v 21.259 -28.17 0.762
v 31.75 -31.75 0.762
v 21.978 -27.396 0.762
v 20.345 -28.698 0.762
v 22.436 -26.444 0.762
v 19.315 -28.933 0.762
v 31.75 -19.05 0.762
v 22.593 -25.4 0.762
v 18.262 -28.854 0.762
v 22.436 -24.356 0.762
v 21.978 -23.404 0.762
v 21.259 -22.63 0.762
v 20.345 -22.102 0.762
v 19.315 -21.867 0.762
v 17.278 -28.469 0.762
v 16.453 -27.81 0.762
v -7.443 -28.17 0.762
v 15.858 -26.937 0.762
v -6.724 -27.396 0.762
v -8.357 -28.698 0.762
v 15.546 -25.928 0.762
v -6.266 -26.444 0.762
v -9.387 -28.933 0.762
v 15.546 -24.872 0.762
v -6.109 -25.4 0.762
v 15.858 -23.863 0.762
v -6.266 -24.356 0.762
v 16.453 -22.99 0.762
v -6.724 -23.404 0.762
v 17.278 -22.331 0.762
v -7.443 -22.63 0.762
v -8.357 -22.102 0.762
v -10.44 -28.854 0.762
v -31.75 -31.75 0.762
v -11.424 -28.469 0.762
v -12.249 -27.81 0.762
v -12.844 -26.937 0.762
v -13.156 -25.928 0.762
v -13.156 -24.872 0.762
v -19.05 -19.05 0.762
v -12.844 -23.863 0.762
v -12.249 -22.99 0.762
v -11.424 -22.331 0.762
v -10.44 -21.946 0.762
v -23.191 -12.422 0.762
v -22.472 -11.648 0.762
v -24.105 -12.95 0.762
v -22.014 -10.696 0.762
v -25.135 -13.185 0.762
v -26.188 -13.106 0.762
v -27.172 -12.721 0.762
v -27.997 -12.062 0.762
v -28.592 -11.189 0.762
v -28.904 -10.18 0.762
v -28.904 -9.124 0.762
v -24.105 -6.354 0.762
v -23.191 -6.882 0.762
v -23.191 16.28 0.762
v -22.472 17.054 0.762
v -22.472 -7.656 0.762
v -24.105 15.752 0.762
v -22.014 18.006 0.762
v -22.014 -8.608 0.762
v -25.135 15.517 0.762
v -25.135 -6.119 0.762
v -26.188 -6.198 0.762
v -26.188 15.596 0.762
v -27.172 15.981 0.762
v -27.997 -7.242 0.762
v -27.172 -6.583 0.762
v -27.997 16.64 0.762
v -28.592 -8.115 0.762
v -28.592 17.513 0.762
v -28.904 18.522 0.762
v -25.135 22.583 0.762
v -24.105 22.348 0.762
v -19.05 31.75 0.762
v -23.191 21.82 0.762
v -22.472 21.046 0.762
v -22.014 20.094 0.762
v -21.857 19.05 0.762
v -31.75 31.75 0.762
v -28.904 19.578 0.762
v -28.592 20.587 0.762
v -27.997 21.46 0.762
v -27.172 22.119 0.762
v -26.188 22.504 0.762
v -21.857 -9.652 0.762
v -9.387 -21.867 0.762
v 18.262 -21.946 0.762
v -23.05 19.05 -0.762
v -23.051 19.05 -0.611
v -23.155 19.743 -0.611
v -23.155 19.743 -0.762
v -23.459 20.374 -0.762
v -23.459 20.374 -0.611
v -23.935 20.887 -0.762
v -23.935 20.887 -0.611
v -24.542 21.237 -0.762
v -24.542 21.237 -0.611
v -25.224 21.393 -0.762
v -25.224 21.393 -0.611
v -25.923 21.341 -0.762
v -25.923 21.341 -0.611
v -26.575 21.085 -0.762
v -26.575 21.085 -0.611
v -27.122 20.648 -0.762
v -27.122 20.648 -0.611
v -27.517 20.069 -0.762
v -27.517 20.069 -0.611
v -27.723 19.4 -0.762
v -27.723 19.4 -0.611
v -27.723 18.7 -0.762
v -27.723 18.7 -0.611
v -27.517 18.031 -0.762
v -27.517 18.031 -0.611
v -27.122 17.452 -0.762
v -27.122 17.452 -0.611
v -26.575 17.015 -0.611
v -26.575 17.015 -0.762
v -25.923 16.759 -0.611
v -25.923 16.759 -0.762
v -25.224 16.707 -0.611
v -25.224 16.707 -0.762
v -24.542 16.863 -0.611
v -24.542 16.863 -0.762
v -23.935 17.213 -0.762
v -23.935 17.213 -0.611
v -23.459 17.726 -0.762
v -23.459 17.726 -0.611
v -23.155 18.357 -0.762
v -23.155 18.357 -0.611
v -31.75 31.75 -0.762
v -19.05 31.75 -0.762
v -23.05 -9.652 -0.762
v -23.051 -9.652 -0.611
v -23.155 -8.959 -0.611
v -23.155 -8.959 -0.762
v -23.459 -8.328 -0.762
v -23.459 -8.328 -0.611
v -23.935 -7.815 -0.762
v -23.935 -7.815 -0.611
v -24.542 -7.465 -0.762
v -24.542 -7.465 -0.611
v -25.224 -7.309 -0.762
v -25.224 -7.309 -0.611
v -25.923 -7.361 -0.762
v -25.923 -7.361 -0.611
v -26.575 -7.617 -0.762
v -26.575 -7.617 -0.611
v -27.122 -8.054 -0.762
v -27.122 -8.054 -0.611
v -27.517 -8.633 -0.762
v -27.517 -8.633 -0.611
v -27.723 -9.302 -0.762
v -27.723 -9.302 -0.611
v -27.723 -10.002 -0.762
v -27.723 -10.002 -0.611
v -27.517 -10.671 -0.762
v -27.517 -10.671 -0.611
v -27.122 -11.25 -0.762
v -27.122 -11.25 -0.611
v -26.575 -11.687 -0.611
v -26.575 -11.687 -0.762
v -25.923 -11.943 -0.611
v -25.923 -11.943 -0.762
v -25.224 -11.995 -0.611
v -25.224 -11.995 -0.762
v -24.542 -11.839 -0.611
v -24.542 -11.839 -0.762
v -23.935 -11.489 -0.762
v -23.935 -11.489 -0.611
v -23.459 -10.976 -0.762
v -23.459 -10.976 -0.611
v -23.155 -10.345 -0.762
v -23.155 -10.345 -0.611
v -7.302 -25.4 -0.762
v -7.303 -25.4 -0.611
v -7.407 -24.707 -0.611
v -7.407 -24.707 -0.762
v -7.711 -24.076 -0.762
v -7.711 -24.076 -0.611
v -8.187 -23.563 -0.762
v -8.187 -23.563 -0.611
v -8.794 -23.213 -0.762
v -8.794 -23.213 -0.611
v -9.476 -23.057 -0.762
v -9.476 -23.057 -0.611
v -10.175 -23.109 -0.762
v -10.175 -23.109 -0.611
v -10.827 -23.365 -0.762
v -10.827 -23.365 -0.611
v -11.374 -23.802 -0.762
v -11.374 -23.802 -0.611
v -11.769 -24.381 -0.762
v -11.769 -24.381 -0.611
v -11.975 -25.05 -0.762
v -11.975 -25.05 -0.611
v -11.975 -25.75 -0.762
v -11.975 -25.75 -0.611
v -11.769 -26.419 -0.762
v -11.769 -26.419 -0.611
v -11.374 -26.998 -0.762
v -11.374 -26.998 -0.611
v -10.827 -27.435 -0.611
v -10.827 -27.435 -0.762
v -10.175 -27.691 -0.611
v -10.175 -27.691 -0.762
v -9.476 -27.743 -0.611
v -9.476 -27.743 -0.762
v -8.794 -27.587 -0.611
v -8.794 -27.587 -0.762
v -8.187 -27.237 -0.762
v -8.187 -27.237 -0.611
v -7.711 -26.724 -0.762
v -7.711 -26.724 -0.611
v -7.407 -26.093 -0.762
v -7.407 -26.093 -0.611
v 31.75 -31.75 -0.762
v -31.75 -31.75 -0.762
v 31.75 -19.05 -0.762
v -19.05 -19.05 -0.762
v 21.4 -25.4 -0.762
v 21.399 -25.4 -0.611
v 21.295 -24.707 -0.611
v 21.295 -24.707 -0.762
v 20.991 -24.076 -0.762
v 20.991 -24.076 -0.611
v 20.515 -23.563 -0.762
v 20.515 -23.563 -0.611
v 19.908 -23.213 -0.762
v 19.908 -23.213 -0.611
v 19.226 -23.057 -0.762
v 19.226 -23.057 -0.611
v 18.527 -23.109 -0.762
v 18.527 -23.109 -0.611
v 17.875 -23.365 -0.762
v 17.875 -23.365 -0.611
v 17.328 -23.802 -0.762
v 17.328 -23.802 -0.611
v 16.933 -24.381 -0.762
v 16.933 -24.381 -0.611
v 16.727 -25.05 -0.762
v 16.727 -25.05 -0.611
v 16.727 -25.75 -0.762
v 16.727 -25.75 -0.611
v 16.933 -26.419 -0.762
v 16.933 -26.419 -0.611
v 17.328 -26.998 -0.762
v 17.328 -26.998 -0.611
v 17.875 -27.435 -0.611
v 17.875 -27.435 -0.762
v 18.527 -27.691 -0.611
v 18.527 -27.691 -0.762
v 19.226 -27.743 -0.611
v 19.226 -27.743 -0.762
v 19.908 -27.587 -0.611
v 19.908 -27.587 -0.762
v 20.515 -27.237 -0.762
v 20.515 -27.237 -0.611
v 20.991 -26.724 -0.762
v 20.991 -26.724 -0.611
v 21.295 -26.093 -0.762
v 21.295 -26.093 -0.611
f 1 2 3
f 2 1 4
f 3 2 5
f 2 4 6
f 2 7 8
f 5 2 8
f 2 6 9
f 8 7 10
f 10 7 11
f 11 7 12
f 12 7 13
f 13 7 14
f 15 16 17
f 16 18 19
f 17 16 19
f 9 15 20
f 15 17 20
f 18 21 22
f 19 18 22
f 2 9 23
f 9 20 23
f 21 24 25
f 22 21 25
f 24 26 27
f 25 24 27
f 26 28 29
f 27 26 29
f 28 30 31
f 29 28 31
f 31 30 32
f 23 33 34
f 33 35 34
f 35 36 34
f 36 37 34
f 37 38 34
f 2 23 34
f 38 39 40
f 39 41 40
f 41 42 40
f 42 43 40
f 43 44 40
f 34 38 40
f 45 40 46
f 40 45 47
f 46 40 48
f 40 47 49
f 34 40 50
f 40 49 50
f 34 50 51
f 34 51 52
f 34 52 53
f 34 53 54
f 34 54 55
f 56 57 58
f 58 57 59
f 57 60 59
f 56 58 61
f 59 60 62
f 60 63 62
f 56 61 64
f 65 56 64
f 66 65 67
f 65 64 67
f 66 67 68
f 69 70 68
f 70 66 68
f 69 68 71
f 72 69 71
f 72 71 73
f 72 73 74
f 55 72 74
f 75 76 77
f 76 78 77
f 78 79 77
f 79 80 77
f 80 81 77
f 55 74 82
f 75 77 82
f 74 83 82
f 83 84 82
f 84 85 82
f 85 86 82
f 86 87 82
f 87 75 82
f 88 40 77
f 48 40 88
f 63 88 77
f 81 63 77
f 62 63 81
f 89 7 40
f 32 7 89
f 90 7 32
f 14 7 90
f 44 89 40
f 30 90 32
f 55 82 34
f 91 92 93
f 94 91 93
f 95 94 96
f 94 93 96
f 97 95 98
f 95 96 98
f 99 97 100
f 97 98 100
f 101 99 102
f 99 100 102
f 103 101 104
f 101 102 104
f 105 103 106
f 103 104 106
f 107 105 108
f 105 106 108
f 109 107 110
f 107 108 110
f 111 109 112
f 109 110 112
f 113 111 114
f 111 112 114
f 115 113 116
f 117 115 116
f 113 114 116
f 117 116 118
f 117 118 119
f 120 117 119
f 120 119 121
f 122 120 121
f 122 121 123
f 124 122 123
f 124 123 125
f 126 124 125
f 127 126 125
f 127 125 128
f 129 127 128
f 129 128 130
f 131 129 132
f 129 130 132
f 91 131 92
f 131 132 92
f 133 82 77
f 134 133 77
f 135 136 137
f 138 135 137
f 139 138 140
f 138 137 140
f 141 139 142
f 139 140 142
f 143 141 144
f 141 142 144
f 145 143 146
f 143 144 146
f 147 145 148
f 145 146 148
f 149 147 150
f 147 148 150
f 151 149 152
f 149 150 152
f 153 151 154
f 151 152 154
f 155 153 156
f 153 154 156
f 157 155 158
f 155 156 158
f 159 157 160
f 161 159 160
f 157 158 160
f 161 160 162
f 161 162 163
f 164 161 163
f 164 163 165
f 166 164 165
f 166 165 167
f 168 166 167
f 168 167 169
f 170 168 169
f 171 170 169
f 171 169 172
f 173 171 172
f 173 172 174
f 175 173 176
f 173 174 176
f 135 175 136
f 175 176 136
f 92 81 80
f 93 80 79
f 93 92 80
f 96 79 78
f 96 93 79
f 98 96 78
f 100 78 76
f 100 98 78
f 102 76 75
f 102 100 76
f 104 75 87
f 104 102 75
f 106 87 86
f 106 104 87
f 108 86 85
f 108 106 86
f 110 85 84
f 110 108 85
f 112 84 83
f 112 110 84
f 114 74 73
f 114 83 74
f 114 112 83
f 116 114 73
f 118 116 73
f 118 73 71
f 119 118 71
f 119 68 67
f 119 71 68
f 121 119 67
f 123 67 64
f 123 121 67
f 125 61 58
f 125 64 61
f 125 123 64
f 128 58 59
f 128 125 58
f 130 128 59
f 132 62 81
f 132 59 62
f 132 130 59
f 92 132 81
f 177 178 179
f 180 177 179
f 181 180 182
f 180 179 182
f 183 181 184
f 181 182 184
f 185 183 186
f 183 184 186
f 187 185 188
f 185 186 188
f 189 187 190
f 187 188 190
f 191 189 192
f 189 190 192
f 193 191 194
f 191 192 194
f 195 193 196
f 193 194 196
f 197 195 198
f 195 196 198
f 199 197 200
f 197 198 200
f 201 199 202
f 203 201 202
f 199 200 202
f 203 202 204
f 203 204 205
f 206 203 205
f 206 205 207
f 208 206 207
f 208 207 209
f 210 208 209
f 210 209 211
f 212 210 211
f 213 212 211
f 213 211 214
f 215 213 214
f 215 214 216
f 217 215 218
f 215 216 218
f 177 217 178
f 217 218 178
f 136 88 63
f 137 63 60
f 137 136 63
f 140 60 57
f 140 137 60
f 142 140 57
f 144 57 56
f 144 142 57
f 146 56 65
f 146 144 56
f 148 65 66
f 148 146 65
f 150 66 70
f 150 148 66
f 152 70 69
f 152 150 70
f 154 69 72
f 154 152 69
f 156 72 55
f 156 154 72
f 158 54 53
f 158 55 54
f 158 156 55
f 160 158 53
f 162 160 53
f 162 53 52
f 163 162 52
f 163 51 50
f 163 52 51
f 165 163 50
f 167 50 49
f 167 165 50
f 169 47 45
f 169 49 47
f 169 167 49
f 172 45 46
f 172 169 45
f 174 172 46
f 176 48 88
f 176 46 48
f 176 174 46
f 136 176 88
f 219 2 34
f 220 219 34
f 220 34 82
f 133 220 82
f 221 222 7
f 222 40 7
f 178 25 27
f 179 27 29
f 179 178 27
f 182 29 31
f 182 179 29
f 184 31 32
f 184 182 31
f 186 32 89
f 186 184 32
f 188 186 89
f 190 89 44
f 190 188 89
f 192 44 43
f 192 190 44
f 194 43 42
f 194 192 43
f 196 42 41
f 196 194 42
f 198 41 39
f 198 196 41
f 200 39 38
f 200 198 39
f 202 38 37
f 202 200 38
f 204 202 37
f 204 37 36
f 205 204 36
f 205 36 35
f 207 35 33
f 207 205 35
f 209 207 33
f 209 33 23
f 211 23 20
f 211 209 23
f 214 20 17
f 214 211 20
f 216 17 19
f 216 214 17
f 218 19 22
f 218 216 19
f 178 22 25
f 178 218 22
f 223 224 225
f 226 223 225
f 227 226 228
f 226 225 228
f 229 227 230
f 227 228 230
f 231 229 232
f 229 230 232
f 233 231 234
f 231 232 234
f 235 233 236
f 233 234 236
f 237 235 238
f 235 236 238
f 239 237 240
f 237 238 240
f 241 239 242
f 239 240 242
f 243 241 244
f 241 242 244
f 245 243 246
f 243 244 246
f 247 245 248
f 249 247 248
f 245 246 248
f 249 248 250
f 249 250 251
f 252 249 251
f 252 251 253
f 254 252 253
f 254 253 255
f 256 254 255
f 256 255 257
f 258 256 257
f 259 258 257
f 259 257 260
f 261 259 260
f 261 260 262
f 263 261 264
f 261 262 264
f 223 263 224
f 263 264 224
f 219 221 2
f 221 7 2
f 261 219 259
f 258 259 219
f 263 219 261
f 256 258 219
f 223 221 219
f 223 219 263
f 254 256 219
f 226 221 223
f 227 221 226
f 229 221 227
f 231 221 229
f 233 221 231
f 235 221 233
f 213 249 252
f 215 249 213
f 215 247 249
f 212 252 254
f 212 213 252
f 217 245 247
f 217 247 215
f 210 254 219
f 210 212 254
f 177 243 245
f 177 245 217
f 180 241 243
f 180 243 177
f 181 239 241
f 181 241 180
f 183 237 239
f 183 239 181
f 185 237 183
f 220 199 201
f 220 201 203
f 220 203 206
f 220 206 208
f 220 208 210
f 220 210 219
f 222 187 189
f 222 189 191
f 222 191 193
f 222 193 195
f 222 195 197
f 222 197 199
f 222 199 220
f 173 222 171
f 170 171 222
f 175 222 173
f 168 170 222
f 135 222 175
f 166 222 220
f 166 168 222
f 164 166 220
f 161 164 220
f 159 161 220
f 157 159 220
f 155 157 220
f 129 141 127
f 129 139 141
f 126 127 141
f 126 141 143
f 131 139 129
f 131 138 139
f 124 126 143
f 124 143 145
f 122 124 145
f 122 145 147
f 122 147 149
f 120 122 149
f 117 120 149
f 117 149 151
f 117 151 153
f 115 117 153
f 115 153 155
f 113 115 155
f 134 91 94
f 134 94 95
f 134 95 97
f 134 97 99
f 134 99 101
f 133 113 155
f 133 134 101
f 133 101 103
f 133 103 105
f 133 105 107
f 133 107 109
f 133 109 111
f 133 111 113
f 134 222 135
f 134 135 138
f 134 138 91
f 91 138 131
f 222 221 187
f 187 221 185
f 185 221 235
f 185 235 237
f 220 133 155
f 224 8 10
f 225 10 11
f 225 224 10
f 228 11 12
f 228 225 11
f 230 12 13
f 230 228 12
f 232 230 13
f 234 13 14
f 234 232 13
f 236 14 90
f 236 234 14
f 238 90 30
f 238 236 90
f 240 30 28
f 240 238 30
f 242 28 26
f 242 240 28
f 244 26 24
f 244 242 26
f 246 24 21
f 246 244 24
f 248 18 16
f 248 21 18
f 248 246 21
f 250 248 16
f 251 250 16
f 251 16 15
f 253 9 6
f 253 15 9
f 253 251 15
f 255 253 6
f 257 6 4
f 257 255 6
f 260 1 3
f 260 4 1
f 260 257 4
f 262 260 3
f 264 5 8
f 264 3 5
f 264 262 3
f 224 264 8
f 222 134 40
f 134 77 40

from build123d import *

# Parameters (mm, degrees)
BOSS_EXTRUDE1_DEPTH      = 0.762
BOSS_EXTRUDE1_DEPTH_BACK = 0.762
SKETCH4_R                = 2.3495
CUT_EXTRUDE1_DEPTH       = 1.762
CUT_EXTRUDE1_DEPTH_BACK  = 1.762
SKETCH5_R                = 3.5433
CUT_EXTRUDE2_DEPTH       = 2.524
CUT_EXTRUDE2_TAPER       = 41


with BuildPart() as part:
    # Sketch3 → Boss-Extrude1 (new body, two sides)
    with BuildSketch(Plane.XY) as boss_extrude1_sk:
        Polygon((-31.75, 31.75), (-19.05, 31.75), (-19.05, -19.05), (31.75, -19.05), (31.75, -31.75), (-31.75, -31.75), align=None)
    extrude(amount=BOSS_EXTRUDE1_DEPTH)
    extrude(boss_extrude1_sk.sketch, amount=-BOSS_EXTRUDE1_DEPTH_BACK)

    # Sketch4 → Cut-Extrude1 (cut, two sides)
    with BuildSketch(Plane.XY) as cut_extrude1_sk:
        with Locations((-25.4, 19.05)):
            Circle(SKETCH4_R)
        with Locations((-25.4, -9.652)):
            Circle(SKETCH4_R)
        with Locations((-9.652, -25.4)):
            Circle(SKETCH4_R)
        with Locations((19.05, -25.4)):
            Circle(SKETCH4_R)
    extrude(amount=CUT_EXTRUDE1_DEPTH, mode=Mode.SUBTRACT)
    extrude(cut_extrude1_sk.sketch, amount=-CUT_EXTRUDE1_DEPTH_BACK, mode=Mode.SUBTRACT)

    # Sketch5 → Cut-Extrude2 (cut, through all)
    with BuildSketch(Plane.XY.offset(0.762)):
        with Locations((-25.4, 19.05)):
            Circle(SKETCH5_R)
        with Locations((-25.4, -9.652)):
            Circle(SKETCH5_R)
        with Locations((-9.652, -25.4)):
            Circle(SKETCH5_R)
        with Locations((19.05, -25.4)):
            Circle(SKETCH5_R)
    extrude(amount=-CUT_EXTRUDE2_DEPTH, taper=CUT_EXTRUDE2_TAPER, mode=Mode.SUBTRACT)


solid = part.part
